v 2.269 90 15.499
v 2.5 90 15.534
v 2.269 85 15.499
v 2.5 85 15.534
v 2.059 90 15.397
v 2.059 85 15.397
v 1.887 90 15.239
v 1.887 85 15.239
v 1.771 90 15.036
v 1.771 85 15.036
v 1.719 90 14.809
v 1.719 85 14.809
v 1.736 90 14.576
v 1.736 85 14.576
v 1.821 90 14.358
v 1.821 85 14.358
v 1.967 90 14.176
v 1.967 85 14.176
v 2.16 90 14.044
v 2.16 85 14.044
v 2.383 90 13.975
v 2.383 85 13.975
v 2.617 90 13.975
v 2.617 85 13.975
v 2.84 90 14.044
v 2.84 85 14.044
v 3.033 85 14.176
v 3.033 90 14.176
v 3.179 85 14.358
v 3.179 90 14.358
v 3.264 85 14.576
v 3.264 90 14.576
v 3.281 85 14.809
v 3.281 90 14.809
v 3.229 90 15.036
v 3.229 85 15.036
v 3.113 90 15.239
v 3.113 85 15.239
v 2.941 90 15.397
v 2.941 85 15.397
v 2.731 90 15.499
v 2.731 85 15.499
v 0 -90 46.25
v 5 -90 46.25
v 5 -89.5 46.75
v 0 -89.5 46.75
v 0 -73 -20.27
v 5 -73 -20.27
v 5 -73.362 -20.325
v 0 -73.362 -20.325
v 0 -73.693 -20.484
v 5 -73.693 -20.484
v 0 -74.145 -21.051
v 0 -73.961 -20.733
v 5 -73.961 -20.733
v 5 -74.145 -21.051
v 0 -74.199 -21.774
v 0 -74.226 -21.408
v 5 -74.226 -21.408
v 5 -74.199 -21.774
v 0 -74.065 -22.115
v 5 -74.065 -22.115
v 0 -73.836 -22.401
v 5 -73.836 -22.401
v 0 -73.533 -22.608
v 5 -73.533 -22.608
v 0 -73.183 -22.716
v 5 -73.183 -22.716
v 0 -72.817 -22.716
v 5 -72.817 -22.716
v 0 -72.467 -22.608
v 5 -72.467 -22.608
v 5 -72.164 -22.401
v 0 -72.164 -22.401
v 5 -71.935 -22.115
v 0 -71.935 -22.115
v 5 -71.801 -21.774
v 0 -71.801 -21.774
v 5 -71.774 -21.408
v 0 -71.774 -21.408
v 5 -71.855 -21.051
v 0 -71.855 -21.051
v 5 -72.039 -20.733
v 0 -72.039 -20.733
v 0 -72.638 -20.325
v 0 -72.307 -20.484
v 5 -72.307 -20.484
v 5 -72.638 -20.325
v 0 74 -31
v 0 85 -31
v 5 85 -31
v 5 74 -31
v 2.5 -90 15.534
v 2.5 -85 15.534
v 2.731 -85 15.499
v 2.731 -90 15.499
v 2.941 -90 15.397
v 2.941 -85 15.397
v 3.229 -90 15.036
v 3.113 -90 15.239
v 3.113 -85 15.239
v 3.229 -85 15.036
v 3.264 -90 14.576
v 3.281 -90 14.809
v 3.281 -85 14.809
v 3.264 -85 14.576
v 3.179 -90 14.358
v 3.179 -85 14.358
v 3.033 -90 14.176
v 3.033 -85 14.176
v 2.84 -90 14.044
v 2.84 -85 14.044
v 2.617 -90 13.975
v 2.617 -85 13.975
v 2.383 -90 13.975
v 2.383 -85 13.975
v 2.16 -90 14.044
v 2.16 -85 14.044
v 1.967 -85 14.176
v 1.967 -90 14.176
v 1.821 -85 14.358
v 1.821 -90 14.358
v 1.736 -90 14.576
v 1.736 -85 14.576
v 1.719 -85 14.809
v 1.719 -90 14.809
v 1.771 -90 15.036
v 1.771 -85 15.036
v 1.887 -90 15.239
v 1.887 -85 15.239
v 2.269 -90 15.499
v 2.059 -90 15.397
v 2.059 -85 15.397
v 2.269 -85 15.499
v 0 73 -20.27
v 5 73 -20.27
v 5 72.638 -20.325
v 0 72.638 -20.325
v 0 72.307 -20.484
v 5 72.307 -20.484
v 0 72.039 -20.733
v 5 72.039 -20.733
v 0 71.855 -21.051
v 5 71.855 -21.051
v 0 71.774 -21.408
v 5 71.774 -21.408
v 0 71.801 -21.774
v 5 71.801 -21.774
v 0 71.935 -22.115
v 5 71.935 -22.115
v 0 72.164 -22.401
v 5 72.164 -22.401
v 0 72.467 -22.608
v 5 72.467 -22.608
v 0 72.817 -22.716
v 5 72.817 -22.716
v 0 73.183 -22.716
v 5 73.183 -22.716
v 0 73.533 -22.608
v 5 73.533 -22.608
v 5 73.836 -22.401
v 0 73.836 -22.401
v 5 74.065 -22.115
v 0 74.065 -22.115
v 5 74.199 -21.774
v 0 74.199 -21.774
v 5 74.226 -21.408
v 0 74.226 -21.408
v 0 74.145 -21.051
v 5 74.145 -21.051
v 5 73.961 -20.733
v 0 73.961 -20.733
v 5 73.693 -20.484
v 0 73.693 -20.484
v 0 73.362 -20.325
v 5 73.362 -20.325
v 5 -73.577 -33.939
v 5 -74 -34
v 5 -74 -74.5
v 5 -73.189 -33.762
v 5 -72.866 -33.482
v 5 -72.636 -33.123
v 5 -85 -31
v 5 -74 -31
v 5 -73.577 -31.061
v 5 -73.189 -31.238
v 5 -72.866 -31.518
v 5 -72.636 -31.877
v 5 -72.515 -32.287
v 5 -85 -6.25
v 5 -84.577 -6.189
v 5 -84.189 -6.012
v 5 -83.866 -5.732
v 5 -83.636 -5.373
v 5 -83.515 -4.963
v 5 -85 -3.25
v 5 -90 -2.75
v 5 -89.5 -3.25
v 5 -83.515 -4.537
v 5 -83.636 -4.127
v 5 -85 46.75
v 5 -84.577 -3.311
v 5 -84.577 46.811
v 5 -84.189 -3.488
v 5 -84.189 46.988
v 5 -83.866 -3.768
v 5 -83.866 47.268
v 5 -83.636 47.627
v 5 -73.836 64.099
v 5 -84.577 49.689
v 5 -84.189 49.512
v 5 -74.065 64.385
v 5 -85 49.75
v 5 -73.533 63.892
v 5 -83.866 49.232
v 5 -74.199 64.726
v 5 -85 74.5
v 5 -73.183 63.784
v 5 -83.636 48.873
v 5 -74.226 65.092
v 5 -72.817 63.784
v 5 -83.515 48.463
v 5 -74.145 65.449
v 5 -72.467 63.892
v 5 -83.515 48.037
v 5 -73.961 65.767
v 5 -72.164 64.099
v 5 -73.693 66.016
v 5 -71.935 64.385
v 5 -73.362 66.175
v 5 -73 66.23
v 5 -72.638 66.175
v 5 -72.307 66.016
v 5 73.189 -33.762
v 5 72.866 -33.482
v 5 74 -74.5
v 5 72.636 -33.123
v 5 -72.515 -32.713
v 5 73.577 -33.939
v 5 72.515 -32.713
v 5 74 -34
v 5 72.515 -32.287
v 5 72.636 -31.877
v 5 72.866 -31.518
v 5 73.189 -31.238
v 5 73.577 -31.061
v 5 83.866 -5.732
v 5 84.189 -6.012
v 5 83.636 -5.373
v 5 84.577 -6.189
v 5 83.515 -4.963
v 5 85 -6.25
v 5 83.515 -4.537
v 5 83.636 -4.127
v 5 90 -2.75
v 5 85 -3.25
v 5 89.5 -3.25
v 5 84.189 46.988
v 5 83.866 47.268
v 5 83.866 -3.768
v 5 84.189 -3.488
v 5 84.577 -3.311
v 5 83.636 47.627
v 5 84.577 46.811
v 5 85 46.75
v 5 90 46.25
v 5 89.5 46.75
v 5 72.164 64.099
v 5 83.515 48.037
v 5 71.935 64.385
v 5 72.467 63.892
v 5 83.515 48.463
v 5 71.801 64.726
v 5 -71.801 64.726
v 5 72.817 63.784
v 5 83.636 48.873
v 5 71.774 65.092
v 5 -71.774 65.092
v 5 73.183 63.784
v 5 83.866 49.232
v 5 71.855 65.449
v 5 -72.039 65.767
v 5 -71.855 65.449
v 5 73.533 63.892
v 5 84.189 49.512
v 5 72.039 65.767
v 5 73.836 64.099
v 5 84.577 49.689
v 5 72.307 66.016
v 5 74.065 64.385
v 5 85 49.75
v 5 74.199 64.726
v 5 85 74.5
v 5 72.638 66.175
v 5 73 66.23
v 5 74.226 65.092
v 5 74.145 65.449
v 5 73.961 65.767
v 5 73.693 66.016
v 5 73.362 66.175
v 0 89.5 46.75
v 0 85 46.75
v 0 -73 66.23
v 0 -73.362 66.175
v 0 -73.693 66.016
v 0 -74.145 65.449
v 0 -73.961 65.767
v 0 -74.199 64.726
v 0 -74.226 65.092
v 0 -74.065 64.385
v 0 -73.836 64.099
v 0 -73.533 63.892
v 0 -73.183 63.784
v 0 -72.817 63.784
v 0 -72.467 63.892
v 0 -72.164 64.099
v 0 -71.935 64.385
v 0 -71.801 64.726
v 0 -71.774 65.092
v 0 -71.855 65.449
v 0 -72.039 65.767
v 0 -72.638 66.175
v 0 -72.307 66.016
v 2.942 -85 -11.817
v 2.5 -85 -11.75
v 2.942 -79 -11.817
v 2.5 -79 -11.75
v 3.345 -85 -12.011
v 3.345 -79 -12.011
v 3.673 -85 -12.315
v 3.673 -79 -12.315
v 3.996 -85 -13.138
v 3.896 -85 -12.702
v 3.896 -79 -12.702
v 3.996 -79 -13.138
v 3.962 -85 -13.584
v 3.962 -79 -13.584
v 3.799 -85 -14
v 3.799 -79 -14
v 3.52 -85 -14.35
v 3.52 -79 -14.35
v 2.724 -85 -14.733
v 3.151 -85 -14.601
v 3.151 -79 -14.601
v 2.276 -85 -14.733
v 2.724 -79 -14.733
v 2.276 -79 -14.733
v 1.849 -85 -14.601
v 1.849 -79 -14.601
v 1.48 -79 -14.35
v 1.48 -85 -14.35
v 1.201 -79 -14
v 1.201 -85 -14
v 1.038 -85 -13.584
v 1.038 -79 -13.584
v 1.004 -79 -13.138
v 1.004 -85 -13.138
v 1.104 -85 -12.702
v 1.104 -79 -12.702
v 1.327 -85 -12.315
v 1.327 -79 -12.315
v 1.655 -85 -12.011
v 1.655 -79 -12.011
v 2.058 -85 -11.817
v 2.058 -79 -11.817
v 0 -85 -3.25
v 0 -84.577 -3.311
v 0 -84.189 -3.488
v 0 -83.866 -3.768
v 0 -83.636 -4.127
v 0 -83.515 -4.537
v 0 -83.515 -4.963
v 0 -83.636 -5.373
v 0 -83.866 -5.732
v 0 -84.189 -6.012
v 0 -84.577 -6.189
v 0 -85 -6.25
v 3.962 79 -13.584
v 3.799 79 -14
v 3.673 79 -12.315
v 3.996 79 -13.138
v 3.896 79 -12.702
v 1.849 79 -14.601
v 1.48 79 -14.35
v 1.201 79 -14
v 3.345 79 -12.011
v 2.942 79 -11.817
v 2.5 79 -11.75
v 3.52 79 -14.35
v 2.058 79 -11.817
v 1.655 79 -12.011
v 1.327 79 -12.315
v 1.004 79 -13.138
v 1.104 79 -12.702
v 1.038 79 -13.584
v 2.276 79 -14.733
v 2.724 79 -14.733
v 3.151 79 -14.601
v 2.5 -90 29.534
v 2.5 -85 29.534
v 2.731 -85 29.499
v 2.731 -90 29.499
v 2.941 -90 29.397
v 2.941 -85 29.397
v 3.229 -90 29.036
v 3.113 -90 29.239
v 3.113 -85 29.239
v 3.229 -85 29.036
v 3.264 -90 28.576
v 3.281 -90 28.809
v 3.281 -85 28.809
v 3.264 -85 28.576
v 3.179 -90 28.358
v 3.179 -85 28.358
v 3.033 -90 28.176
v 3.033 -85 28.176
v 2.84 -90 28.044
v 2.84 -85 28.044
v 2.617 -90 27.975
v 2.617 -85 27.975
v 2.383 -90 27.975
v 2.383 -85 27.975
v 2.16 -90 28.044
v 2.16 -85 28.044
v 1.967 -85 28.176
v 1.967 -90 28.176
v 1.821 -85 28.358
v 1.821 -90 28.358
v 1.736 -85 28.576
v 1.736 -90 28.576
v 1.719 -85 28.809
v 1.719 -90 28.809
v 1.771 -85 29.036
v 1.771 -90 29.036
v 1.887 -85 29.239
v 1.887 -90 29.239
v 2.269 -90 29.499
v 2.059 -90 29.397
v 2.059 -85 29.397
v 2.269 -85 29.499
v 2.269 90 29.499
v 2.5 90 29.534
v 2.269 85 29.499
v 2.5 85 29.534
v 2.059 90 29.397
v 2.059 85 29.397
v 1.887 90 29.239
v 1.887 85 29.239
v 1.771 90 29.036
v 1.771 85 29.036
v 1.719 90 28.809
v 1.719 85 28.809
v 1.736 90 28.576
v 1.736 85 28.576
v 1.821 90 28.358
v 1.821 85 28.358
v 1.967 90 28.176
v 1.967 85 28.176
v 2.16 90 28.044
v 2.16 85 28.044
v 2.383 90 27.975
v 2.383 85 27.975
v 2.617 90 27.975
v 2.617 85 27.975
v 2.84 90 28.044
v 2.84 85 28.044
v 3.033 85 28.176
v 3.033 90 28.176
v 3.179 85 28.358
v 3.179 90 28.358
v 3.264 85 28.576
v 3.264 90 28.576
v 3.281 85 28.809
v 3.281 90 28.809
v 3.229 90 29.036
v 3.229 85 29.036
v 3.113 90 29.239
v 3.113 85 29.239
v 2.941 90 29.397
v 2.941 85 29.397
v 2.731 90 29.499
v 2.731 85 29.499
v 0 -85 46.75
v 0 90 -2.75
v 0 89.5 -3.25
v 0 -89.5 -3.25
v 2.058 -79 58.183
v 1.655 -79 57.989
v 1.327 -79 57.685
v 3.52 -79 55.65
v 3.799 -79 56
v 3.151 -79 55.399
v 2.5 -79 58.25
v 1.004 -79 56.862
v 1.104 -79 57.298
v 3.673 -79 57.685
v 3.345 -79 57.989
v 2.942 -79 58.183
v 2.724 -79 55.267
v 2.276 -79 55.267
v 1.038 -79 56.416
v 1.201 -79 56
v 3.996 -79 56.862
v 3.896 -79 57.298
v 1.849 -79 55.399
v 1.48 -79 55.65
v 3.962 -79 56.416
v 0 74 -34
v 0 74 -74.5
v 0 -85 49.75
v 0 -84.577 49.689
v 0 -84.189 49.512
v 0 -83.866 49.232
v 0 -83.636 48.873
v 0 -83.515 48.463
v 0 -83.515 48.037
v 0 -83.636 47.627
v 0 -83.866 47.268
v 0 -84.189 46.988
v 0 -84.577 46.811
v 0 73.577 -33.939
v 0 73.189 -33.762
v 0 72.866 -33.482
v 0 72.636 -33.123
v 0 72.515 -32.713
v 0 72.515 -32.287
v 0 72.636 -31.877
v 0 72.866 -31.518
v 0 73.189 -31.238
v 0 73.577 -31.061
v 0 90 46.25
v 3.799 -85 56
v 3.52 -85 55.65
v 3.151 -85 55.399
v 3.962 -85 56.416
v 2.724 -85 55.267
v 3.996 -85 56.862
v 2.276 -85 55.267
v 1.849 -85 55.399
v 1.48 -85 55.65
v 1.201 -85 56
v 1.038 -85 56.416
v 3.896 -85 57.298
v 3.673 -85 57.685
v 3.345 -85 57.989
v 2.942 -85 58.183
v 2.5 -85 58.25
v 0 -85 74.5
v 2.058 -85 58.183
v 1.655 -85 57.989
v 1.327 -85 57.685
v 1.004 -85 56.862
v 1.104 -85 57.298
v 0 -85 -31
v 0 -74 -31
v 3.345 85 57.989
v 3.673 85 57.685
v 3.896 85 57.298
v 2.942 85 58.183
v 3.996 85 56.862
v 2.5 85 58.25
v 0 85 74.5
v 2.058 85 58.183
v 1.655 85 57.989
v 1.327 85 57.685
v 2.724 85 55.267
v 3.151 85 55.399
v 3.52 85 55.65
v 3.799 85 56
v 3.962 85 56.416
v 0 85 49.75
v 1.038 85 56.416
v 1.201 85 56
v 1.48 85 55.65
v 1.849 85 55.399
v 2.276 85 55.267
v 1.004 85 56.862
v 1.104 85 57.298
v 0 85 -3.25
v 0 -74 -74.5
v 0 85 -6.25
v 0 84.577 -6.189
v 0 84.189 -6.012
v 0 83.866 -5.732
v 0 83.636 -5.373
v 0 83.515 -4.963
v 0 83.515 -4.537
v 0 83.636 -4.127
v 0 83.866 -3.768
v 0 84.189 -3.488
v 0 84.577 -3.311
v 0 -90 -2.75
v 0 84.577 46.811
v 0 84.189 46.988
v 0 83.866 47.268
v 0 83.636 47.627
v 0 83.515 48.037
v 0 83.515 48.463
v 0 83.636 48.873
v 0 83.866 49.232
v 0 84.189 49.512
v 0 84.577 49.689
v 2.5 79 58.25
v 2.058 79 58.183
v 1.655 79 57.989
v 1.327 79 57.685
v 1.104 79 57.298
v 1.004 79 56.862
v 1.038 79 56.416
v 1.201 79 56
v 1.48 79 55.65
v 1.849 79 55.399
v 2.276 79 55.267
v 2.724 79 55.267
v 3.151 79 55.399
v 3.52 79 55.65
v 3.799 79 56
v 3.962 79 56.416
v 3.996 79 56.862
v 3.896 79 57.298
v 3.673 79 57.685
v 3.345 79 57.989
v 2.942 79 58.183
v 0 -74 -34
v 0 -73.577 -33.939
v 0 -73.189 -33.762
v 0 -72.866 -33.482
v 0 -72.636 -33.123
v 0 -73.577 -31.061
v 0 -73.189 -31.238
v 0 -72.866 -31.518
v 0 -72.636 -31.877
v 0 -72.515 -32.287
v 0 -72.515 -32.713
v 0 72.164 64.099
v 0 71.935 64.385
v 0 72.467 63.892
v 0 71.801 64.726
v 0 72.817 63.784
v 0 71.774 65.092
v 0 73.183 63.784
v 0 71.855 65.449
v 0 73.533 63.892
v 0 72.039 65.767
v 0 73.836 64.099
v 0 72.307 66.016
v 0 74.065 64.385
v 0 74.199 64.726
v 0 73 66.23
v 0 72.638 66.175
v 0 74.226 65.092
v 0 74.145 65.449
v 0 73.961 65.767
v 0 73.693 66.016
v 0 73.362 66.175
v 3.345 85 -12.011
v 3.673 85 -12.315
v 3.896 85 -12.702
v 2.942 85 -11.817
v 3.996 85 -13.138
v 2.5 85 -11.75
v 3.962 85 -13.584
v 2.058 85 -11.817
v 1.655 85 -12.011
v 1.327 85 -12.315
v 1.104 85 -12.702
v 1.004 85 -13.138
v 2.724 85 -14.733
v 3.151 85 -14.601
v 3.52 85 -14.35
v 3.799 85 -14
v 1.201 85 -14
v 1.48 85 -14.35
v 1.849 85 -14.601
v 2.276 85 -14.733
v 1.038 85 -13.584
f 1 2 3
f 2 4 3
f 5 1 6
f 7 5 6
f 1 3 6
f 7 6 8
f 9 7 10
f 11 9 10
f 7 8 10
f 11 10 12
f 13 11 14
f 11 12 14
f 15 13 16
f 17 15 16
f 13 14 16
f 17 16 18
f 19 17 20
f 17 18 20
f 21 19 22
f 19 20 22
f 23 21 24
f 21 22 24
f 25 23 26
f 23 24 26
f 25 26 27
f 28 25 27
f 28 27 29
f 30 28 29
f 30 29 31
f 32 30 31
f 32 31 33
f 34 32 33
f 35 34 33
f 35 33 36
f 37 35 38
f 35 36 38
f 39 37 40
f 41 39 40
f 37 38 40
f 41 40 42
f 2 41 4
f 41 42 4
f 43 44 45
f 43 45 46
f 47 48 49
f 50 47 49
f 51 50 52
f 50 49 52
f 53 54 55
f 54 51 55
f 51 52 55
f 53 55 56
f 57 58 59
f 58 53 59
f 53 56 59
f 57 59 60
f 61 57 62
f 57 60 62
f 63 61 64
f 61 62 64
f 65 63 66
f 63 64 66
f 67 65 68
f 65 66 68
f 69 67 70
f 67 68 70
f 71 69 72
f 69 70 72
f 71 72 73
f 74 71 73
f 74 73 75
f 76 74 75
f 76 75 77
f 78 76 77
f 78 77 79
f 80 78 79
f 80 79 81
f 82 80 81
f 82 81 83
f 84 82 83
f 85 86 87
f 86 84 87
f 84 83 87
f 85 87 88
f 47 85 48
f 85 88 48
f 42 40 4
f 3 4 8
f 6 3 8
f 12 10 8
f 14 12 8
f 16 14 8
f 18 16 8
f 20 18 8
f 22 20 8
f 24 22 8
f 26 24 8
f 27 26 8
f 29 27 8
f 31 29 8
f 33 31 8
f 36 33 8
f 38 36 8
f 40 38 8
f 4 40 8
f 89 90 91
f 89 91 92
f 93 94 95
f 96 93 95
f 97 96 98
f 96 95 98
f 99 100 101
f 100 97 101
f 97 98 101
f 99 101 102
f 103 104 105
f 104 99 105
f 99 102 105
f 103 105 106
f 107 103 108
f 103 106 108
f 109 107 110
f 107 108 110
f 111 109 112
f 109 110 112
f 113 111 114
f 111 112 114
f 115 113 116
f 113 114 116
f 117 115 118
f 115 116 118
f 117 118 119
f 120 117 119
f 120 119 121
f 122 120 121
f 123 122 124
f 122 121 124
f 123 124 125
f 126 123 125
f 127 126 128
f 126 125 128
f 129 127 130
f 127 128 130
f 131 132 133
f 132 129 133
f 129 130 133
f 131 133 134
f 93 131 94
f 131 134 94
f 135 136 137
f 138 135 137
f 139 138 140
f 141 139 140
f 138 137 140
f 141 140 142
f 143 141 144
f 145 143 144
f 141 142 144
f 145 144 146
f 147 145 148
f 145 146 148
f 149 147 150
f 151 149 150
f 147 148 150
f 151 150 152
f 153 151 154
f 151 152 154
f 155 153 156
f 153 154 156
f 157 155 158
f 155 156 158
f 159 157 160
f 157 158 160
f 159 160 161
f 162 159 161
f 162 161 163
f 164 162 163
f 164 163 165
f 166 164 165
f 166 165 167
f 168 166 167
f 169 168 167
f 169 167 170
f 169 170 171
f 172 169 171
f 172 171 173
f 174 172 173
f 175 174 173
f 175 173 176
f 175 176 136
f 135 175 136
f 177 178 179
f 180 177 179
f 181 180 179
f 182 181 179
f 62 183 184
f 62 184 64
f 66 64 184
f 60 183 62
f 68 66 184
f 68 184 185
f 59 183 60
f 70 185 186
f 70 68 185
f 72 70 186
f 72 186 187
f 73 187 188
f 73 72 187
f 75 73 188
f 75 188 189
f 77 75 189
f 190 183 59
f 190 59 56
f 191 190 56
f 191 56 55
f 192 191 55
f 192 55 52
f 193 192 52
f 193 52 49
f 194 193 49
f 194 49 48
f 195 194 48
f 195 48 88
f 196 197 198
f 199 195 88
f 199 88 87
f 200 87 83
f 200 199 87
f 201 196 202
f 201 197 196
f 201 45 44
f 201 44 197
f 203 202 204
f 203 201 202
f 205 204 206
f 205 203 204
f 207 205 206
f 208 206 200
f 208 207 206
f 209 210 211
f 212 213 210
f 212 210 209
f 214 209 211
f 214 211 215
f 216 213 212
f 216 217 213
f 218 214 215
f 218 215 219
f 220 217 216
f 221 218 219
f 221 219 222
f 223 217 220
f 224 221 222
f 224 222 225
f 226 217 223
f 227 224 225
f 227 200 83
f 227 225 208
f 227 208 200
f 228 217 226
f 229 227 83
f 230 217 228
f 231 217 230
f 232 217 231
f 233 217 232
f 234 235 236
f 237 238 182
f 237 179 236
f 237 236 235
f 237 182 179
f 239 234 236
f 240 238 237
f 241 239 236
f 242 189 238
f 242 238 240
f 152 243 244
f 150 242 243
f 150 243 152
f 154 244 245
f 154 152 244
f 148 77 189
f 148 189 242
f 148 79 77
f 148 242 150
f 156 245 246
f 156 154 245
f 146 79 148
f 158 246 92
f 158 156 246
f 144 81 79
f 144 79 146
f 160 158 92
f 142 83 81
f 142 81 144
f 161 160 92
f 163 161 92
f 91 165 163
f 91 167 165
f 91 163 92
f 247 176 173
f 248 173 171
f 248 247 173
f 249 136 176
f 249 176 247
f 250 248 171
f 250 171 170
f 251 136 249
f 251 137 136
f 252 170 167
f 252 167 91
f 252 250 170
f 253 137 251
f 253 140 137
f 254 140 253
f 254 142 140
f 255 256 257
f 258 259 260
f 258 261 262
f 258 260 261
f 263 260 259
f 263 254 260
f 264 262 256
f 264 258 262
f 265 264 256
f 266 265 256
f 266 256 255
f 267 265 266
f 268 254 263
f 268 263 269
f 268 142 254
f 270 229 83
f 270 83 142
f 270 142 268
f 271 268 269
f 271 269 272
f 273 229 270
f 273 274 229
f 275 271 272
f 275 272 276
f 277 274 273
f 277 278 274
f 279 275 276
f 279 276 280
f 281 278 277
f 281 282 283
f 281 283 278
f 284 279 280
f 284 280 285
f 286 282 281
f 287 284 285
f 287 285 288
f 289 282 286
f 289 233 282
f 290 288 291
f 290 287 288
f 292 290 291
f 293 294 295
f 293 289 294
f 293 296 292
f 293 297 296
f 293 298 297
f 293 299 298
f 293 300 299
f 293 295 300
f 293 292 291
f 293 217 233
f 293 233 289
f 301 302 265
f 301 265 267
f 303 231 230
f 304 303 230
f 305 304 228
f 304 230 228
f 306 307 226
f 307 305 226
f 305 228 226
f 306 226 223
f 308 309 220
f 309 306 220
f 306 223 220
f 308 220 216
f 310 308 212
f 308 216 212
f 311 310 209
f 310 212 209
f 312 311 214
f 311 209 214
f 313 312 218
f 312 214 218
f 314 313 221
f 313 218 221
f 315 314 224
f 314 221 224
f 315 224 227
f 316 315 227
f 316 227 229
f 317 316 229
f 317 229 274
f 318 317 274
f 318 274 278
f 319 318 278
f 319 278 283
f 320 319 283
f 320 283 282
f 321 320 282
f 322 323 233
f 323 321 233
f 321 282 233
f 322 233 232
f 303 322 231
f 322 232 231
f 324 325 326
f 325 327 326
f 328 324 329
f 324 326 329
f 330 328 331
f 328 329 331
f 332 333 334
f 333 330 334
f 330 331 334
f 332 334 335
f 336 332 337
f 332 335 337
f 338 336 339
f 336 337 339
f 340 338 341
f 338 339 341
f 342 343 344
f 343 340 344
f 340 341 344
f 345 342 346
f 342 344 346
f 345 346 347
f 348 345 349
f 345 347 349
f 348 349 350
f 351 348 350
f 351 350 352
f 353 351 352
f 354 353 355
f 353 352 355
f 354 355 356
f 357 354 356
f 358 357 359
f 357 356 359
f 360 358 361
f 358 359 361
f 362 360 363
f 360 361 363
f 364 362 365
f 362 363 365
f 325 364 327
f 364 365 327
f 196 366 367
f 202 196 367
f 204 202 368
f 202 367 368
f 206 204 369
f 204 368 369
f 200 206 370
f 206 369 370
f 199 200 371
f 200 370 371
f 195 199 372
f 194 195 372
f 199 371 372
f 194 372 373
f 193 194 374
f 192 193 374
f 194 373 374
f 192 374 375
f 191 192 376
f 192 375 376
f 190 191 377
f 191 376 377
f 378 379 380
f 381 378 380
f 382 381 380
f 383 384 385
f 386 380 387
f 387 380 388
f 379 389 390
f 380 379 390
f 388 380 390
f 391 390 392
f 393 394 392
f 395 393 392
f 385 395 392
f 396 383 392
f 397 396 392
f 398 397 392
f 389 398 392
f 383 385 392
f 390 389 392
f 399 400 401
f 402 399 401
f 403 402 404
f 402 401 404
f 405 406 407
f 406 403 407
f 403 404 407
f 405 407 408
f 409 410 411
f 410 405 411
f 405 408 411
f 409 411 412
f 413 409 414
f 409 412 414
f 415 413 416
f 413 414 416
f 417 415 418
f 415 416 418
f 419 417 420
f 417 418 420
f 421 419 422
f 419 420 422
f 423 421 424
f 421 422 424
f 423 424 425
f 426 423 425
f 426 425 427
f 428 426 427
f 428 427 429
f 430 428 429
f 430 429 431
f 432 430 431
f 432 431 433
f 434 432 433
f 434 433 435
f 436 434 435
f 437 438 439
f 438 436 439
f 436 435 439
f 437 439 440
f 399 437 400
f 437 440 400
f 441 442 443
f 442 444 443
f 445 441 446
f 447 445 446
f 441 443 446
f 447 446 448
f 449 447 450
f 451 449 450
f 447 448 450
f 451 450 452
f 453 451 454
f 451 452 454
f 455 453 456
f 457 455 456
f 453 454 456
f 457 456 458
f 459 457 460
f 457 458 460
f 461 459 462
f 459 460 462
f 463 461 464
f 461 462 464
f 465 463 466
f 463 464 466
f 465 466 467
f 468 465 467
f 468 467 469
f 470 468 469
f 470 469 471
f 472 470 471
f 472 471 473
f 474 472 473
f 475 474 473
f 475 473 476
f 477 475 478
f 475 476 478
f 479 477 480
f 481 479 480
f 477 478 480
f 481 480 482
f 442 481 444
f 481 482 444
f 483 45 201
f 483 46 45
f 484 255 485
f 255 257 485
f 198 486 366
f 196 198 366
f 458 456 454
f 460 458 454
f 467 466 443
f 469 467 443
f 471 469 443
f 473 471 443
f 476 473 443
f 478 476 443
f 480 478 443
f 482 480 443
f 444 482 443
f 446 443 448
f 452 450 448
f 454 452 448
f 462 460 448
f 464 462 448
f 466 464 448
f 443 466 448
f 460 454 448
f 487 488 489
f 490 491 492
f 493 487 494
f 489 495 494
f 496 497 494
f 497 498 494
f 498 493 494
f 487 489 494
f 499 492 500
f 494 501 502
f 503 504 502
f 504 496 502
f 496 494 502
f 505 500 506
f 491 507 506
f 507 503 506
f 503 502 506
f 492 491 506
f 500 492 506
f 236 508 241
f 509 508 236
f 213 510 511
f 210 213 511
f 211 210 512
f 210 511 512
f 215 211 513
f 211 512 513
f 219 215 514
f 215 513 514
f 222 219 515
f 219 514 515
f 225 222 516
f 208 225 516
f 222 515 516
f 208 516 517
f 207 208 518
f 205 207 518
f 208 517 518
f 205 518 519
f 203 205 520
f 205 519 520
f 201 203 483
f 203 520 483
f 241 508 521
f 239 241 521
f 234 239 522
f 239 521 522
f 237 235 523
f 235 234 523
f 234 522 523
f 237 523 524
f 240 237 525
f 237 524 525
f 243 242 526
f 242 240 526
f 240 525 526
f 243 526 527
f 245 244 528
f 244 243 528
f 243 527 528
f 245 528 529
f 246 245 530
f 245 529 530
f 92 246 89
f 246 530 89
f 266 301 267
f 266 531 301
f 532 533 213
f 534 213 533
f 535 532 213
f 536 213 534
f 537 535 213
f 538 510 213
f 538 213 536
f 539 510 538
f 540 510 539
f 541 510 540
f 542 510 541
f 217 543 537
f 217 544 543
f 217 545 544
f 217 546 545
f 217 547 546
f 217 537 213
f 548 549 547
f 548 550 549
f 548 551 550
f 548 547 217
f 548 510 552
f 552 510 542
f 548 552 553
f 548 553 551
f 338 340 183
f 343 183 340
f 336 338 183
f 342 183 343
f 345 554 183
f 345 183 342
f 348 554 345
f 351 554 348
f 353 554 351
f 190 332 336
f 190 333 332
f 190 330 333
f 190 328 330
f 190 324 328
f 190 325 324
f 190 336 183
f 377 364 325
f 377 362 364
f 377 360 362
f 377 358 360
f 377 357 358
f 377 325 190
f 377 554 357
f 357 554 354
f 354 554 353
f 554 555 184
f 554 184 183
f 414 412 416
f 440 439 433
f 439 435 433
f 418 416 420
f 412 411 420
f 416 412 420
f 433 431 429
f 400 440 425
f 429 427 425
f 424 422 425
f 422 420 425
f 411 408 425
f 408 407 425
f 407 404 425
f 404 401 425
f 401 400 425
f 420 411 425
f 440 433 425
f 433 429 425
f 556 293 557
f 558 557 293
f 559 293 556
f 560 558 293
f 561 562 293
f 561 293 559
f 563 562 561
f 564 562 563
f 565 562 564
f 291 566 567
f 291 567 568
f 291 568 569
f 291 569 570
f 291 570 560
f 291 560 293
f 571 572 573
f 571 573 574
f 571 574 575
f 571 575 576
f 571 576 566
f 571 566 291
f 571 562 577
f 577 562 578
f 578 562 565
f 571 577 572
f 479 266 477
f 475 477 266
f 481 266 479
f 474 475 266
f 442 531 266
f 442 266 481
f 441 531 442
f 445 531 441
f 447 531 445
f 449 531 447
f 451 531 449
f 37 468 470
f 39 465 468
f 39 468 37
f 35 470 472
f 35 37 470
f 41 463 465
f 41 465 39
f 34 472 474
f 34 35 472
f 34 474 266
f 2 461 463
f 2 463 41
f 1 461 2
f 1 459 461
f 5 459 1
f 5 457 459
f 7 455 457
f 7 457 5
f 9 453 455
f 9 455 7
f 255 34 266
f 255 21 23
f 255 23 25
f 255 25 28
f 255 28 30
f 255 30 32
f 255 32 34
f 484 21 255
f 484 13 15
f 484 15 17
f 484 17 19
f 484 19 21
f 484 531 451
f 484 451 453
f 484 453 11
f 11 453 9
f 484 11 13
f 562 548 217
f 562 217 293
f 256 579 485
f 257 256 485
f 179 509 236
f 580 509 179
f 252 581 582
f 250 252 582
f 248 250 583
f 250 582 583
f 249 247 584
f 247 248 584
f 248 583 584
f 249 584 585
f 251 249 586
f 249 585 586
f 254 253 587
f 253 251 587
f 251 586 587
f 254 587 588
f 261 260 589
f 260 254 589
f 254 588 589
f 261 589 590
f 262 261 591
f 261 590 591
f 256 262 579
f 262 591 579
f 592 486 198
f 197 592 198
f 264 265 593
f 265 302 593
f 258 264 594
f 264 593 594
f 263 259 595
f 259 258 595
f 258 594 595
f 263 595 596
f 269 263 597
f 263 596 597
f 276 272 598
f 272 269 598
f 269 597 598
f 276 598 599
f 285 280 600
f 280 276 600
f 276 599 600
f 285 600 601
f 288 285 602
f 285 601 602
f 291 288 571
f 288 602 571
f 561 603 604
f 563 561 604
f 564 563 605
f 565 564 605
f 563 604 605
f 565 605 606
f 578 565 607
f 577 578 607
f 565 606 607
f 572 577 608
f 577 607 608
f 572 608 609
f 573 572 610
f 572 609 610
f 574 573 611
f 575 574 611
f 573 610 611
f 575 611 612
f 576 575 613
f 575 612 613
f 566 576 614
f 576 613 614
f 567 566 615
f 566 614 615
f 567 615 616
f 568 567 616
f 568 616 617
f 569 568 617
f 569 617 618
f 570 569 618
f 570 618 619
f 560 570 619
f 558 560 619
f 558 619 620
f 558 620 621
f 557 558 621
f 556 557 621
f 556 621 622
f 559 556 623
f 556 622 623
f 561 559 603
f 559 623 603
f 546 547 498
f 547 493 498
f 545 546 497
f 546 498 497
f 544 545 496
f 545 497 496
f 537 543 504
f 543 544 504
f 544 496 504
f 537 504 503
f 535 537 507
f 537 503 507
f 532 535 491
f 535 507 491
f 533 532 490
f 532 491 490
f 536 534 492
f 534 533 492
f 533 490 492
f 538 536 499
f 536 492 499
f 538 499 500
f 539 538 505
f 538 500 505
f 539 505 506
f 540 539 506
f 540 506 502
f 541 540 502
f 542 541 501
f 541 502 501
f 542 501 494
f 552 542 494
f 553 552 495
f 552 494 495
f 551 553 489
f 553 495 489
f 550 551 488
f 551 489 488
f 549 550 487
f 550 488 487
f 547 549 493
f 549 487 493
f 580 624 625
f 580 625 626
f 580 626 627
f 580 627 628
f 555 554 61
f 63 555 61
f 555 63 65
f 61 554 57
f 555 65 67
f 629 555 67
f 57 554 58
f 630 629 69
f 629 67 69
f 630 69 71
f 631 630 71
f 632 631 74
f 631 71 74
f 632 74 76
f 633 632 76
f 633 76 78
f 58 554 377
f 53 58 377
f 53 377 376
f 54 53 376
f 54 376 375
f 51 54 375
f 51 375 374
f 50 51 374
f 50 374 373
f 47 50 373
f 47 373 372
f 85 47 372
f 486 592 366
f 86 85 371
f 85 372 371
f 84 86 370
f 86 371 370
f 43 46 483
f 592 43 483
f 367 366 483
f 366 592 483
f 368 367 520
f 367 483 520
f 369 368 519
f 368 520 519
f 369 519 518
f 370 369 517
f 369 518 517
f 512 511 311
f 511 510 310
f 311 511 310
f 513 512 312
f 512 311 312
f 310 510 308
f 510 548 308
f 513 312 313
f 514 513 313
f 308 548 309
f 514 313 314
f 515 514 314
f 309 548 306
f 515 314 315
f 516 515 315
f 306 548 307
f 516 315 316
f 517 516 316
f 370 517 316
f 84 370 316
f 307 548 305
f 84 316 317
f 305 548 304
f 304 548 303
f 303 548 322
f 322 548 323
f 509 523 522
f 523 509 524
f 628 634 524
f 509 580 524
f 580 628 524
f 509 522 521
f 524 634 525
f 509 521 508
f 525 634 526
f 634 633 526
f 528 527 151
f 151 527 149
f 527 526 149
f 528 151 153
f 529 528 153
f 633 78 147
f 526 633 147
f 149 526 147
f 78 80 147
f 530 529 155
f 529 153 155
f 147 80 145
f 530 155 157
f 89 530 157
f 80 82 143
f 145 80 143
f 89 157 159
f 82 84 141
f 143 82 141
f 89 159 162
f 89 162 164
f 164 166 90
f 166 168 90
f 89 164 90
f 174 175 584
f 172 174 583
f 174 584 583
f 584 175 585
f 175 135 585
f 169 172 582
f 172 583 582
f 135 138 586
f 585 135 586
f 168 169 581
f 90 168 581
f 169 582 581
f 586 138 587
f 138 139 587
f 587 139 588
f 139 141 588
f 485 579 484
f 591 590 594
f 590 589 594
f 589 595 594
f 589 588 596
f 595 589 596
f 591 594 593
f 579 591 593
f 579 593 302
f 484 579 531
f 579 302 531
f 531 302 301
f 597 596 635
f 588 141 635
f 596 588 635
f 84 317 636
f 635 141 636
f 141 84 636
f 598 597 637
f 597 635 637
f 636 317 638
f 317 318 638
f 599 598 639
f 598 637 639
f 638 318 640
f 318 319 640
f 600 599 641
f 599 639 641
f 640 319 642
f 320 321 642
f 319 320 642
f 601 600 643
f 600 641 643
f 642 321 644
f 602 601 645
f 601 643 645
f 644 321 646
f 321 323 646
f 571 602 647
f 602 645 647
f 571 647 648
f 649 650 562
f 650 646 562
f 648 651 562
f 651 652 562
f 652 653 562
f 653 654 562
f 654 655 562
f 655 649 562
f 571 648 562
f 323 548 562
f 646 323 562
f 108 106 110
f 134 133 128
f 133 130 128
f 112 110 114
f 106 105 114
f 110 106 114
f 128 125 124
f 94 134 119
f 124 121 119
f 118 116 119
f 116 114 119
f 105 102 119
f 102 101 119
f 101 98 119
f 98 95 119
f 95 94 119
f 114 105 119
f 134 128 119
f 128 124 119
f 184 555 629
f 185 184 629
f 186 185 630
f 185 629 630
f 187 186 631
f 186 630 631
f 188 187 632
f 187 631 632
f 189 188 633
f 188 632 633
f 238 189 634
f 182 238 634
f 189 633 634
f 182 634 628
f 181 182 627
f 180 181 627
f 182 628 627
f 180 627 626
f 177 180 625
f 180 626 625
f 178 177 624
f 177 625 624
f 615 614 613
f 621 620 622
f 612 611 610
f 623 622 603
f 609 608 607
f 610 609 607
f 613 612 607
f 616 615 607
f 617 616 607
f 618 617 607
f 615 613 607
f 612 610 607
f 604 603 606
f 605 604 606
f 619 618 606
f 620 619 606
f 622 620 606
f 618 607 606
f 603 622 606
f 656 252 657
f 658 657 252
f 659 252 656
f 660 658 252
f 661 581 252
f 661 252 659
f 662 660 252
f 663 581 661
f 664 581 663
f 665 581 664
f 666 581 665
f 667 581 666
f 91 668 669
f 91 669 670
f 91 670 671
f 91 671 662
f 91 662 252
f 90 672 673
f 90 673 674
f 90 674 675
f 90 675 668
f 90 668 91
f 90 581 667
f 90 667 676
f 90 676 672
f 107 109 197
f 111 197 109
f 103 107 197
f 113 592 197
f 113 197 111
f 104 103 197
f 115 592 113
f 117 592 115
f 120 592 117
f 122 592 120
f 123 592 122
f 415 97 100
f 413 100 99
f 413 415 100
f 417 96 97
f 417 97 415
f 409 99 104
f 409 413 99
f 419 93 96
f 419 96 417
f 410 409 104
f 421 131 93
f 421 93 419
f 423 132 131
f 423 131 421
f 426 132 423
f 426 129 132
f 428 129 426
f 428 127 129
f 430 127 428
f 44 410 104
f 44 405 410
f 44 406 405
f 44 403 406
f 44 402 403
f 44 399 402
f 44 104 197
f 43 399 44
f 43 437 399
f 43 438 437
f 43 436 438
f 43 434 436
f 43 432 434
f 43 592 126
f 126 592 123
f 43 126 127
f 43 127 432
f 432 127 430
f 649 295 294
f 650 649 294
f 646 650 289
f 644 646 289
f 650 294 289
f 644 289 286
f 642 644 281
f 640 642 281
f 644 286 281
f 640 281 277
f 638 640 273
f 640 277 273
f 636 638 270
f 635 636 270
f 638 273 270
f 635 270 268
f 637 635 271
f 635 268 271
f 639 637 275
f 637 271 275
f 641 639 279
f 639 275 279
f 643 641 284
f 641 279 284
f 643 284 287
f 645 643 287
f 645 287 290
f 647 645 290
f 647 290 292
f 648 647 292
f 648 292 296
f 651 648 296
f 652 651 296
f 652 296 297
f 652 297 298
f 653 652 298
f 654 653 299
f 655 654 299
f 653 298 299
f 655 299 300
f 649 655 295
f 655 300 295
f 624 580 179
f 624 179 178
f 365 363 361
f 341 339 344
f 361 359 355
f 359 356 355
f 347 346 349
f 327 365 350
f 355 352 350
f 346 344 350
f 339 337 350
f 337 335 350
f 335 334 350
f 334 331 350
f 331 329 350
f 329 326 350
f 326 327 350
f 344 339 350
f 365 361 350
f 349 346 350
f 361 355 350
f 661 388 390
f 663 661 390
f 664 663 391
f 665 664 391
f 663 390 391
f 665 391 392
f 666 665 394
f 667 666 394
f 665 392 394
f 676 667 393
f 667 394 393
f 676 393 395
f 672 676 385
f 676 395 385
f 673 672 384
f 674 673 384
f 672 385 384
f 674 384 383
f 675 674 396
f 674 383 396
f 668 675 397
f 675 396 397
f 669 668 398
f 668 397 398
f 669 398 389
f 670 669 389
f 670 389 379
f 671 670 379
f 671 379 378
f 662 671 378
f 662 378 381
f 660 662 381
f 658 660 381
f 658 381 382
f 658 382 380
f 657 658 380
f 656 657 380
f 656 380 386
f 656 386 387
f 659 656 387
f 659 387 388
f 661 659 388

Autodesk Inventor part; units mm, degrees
ref_plane "YZ Plane" through (0, 0, 0) normal (1, 0, 0) x (0, 1, 0)
ref_plane "XZ Plane" through (0, 0, 0) normal (0, 1, 0) x (-1, 0, 0)
ref_plane "XY Plane" through (0, 0, 0) normal (0, 0, 1) x (1, 0, 0)
sketch "Sketch1" plane through (0, 0, 0) normal (1, 0, 0) x (0, 1, 0)
  line L0 (-90, 74.5) -> (90, 74.5)
  line L1 (90, 74.5) -> (90, -74.5)
  line L2 (90, -74.5) -> (-90, -74.5)
  line L3 (-90, -74.5) -> (-90, 74.5) construction
  line L4 (-90, 74.5) -> (90, -74.5) construction
  line L5 (90, 74.5) -> (-90, -74.5) construction
  line L6 (85, 74.5) -> (85, 46.75)
  line L7 (85, 46.75) -> (90, 46.75)
  line L8 (0, 74.5) -> (0, -74.5)
  line L9 (90, 0) -> (-90, 0) construction
  arc A0 (85, 49.75) -> (85, 46.75) centre (85, 48.25) ccw
  line L10 (-90, 74.5) -> (-90, -74.5)
  circle A1 centre (73, 65) radius 3 construction
  arc A2 (73, 67.1) -> (73, 62.9) centre (73, 65) ccw construction
  line L11 (73, 67.1) -> (76.5201, 67.1) construction
  arc A3 (76.5201, 62.9) -> (76.5201, 67.1) centre (80.5, 65) ccw construction
  line L12 (73, 65) -> (80.5, 65) construction
  line L13 (73, 62.9) -> (76.5201, 62.9) construction
  line L14 (90, 28.75) -> (85, 28.75) construction
  line L15 (90, 14.75) -> (85, 14.75) construction
  line L16 (90, 21.75) -> (85, 21.75) construction
  line L17 (85, -3.25) -> (90, -3.25)
  arc A4 (85, -3.25) -> (85, -6.25) centre (85, -4.75) ccw
  line L18 (85, -6.25) -> (85, -74.5)
  line L19 (90, -31) -> (-90, -31)
  line L20 (74, -31) -> (74, -74.5)
  line L21 (-90, 21.75) -> (90, 21.75) construction
  circle A5 centre (73, -21.5) radius 3 construction
  arc A6 (73, -19.4) -> (73, -23.6) centre (73, -21.5) ccw construction
  line L22 (73, -23.6) -> (76.5201, -23.6) construction
  arc A7 (76.5201, -23.6) -> (76.5201, -19.4) centre (80.5, -21.5) ccw construction
  line L23 (73, -21.5) -> (80.5, -21.5) construction
  line L24 (73, -19.4) -> (76.5201, -19.4) construction
  arc A8 (74, -31) -> (74, -34) centre (74, -32.5) ccw
  point P0 (0, 0)
  point P1 (90, -3.25)
  point P2 (85, -31)
  point P3 (85, 65)
  point P4 (85, -21.5)
  point P5 (0, -31)
  dimension "d0" = 180
  dimension "d1" = 149
  dimension "d2" = 1.5
  dimension "d3" = 5
  dimension "d15" = 6
  dimension "d16" = 4.2
  dimension "d17" = 9
  dimension "d18" = 5
  dimension "d27" = 5
  dimension "d28" = 14
  dimension "d38" = 50
  dimension "d40" = 52.75
  dimension "d44" = 11
  dimension "d45" = 43.5
  dimension "d46" = 5
  dimension "d47" = 105.5
extrude "Extrusion1" add sketch "Sketch1" along normal blind 5 contours L0 L6 A0 L7 L1 L17 A4 L18 L19 L8 | L19 A8 L20 L2 L8
sketch "Sketch2" plane through (0, 90, 46.75) normal (0, 1, 0) x (1, 0, 0)
  line L0 (5, 32) -> (0, 32) construction
  line L1 (5, 18) -> (0, 18) construction
  line L2 (5, 50) -> (5, 0) projected
  line L3 (0, 50) -> (0, 0) projected
  point P0 (0, 46.75)
  point P1 (2.5, 32)
  point P2 (2.5, 18)
  point P3 (0, 18)
  point P4 (0, 32)
  point P5 (5, 121.25)
  point P6 (5, -27.75)
  point P7 (0, 121.25)
  point P8 (0, -27.75)
  point P9 (5, 77.75)
  point P10 (0, 77.75)
hole "Side-M2" at (2.5, 90, 14.75) at (2.5, 90, 28.75) direction (0, -1, 0) diameter 1.567 depth 5 thread size "M2x0.4" class "6H" standard "ANSI Metric M Profile"
hole "M3" at (0, 73, 65) at (0, 73, -21.5) direction (1, 0, 0) diameter 2.459 end through all thread size "M3x0.5" class "6H" standard "ANSI Metric M Profile"
sketch "Sketch3" plane through (0, 85, 74.5) normal (0, 1, 0) x (1, 0, 0)
  line L0 (5, 24.75) -> (5, 0) projected
  line L1 (5, 17.75) -> (0, 17.75)
  line L2 (5, 105.5) -> (5, 80.75) projected
  line L3 (5, 87.75) -> (0, 87.75)
  line L4 (0, 24.75) -> (0, 0) projected
  line L5 (0, 105.5) -> (0, 80.75) projected
  line L6 (0, 52.75) -> (5, 52.75) construction
  point P0 (0, 74.5)
  point P1 (2.5, 17.75)
  point P2 (2.5, 87.75)
  point P3 (0, 52.75)
  dimension "d48" = 70
hole "Phi3.0" at (2.5, 85, 56.75) at (2.5, 85, -13.25) direction (0, -1, 0) diameter 3 depth 6
chamfer "C0.5" distance 0.5 angle 45 2 edges at (2.5, 90, 46.75) (2.5, 90, -3.25)
mirror "Mirror1" about plane through (0, 0, 0) normal (0, 1, 0)
equation "\"d40\" = 0.5 * d47"
equation "\"d13\" = d27"
properties part number "TorsoCoverFrameBasis" material "Acetal Resin, Black"
